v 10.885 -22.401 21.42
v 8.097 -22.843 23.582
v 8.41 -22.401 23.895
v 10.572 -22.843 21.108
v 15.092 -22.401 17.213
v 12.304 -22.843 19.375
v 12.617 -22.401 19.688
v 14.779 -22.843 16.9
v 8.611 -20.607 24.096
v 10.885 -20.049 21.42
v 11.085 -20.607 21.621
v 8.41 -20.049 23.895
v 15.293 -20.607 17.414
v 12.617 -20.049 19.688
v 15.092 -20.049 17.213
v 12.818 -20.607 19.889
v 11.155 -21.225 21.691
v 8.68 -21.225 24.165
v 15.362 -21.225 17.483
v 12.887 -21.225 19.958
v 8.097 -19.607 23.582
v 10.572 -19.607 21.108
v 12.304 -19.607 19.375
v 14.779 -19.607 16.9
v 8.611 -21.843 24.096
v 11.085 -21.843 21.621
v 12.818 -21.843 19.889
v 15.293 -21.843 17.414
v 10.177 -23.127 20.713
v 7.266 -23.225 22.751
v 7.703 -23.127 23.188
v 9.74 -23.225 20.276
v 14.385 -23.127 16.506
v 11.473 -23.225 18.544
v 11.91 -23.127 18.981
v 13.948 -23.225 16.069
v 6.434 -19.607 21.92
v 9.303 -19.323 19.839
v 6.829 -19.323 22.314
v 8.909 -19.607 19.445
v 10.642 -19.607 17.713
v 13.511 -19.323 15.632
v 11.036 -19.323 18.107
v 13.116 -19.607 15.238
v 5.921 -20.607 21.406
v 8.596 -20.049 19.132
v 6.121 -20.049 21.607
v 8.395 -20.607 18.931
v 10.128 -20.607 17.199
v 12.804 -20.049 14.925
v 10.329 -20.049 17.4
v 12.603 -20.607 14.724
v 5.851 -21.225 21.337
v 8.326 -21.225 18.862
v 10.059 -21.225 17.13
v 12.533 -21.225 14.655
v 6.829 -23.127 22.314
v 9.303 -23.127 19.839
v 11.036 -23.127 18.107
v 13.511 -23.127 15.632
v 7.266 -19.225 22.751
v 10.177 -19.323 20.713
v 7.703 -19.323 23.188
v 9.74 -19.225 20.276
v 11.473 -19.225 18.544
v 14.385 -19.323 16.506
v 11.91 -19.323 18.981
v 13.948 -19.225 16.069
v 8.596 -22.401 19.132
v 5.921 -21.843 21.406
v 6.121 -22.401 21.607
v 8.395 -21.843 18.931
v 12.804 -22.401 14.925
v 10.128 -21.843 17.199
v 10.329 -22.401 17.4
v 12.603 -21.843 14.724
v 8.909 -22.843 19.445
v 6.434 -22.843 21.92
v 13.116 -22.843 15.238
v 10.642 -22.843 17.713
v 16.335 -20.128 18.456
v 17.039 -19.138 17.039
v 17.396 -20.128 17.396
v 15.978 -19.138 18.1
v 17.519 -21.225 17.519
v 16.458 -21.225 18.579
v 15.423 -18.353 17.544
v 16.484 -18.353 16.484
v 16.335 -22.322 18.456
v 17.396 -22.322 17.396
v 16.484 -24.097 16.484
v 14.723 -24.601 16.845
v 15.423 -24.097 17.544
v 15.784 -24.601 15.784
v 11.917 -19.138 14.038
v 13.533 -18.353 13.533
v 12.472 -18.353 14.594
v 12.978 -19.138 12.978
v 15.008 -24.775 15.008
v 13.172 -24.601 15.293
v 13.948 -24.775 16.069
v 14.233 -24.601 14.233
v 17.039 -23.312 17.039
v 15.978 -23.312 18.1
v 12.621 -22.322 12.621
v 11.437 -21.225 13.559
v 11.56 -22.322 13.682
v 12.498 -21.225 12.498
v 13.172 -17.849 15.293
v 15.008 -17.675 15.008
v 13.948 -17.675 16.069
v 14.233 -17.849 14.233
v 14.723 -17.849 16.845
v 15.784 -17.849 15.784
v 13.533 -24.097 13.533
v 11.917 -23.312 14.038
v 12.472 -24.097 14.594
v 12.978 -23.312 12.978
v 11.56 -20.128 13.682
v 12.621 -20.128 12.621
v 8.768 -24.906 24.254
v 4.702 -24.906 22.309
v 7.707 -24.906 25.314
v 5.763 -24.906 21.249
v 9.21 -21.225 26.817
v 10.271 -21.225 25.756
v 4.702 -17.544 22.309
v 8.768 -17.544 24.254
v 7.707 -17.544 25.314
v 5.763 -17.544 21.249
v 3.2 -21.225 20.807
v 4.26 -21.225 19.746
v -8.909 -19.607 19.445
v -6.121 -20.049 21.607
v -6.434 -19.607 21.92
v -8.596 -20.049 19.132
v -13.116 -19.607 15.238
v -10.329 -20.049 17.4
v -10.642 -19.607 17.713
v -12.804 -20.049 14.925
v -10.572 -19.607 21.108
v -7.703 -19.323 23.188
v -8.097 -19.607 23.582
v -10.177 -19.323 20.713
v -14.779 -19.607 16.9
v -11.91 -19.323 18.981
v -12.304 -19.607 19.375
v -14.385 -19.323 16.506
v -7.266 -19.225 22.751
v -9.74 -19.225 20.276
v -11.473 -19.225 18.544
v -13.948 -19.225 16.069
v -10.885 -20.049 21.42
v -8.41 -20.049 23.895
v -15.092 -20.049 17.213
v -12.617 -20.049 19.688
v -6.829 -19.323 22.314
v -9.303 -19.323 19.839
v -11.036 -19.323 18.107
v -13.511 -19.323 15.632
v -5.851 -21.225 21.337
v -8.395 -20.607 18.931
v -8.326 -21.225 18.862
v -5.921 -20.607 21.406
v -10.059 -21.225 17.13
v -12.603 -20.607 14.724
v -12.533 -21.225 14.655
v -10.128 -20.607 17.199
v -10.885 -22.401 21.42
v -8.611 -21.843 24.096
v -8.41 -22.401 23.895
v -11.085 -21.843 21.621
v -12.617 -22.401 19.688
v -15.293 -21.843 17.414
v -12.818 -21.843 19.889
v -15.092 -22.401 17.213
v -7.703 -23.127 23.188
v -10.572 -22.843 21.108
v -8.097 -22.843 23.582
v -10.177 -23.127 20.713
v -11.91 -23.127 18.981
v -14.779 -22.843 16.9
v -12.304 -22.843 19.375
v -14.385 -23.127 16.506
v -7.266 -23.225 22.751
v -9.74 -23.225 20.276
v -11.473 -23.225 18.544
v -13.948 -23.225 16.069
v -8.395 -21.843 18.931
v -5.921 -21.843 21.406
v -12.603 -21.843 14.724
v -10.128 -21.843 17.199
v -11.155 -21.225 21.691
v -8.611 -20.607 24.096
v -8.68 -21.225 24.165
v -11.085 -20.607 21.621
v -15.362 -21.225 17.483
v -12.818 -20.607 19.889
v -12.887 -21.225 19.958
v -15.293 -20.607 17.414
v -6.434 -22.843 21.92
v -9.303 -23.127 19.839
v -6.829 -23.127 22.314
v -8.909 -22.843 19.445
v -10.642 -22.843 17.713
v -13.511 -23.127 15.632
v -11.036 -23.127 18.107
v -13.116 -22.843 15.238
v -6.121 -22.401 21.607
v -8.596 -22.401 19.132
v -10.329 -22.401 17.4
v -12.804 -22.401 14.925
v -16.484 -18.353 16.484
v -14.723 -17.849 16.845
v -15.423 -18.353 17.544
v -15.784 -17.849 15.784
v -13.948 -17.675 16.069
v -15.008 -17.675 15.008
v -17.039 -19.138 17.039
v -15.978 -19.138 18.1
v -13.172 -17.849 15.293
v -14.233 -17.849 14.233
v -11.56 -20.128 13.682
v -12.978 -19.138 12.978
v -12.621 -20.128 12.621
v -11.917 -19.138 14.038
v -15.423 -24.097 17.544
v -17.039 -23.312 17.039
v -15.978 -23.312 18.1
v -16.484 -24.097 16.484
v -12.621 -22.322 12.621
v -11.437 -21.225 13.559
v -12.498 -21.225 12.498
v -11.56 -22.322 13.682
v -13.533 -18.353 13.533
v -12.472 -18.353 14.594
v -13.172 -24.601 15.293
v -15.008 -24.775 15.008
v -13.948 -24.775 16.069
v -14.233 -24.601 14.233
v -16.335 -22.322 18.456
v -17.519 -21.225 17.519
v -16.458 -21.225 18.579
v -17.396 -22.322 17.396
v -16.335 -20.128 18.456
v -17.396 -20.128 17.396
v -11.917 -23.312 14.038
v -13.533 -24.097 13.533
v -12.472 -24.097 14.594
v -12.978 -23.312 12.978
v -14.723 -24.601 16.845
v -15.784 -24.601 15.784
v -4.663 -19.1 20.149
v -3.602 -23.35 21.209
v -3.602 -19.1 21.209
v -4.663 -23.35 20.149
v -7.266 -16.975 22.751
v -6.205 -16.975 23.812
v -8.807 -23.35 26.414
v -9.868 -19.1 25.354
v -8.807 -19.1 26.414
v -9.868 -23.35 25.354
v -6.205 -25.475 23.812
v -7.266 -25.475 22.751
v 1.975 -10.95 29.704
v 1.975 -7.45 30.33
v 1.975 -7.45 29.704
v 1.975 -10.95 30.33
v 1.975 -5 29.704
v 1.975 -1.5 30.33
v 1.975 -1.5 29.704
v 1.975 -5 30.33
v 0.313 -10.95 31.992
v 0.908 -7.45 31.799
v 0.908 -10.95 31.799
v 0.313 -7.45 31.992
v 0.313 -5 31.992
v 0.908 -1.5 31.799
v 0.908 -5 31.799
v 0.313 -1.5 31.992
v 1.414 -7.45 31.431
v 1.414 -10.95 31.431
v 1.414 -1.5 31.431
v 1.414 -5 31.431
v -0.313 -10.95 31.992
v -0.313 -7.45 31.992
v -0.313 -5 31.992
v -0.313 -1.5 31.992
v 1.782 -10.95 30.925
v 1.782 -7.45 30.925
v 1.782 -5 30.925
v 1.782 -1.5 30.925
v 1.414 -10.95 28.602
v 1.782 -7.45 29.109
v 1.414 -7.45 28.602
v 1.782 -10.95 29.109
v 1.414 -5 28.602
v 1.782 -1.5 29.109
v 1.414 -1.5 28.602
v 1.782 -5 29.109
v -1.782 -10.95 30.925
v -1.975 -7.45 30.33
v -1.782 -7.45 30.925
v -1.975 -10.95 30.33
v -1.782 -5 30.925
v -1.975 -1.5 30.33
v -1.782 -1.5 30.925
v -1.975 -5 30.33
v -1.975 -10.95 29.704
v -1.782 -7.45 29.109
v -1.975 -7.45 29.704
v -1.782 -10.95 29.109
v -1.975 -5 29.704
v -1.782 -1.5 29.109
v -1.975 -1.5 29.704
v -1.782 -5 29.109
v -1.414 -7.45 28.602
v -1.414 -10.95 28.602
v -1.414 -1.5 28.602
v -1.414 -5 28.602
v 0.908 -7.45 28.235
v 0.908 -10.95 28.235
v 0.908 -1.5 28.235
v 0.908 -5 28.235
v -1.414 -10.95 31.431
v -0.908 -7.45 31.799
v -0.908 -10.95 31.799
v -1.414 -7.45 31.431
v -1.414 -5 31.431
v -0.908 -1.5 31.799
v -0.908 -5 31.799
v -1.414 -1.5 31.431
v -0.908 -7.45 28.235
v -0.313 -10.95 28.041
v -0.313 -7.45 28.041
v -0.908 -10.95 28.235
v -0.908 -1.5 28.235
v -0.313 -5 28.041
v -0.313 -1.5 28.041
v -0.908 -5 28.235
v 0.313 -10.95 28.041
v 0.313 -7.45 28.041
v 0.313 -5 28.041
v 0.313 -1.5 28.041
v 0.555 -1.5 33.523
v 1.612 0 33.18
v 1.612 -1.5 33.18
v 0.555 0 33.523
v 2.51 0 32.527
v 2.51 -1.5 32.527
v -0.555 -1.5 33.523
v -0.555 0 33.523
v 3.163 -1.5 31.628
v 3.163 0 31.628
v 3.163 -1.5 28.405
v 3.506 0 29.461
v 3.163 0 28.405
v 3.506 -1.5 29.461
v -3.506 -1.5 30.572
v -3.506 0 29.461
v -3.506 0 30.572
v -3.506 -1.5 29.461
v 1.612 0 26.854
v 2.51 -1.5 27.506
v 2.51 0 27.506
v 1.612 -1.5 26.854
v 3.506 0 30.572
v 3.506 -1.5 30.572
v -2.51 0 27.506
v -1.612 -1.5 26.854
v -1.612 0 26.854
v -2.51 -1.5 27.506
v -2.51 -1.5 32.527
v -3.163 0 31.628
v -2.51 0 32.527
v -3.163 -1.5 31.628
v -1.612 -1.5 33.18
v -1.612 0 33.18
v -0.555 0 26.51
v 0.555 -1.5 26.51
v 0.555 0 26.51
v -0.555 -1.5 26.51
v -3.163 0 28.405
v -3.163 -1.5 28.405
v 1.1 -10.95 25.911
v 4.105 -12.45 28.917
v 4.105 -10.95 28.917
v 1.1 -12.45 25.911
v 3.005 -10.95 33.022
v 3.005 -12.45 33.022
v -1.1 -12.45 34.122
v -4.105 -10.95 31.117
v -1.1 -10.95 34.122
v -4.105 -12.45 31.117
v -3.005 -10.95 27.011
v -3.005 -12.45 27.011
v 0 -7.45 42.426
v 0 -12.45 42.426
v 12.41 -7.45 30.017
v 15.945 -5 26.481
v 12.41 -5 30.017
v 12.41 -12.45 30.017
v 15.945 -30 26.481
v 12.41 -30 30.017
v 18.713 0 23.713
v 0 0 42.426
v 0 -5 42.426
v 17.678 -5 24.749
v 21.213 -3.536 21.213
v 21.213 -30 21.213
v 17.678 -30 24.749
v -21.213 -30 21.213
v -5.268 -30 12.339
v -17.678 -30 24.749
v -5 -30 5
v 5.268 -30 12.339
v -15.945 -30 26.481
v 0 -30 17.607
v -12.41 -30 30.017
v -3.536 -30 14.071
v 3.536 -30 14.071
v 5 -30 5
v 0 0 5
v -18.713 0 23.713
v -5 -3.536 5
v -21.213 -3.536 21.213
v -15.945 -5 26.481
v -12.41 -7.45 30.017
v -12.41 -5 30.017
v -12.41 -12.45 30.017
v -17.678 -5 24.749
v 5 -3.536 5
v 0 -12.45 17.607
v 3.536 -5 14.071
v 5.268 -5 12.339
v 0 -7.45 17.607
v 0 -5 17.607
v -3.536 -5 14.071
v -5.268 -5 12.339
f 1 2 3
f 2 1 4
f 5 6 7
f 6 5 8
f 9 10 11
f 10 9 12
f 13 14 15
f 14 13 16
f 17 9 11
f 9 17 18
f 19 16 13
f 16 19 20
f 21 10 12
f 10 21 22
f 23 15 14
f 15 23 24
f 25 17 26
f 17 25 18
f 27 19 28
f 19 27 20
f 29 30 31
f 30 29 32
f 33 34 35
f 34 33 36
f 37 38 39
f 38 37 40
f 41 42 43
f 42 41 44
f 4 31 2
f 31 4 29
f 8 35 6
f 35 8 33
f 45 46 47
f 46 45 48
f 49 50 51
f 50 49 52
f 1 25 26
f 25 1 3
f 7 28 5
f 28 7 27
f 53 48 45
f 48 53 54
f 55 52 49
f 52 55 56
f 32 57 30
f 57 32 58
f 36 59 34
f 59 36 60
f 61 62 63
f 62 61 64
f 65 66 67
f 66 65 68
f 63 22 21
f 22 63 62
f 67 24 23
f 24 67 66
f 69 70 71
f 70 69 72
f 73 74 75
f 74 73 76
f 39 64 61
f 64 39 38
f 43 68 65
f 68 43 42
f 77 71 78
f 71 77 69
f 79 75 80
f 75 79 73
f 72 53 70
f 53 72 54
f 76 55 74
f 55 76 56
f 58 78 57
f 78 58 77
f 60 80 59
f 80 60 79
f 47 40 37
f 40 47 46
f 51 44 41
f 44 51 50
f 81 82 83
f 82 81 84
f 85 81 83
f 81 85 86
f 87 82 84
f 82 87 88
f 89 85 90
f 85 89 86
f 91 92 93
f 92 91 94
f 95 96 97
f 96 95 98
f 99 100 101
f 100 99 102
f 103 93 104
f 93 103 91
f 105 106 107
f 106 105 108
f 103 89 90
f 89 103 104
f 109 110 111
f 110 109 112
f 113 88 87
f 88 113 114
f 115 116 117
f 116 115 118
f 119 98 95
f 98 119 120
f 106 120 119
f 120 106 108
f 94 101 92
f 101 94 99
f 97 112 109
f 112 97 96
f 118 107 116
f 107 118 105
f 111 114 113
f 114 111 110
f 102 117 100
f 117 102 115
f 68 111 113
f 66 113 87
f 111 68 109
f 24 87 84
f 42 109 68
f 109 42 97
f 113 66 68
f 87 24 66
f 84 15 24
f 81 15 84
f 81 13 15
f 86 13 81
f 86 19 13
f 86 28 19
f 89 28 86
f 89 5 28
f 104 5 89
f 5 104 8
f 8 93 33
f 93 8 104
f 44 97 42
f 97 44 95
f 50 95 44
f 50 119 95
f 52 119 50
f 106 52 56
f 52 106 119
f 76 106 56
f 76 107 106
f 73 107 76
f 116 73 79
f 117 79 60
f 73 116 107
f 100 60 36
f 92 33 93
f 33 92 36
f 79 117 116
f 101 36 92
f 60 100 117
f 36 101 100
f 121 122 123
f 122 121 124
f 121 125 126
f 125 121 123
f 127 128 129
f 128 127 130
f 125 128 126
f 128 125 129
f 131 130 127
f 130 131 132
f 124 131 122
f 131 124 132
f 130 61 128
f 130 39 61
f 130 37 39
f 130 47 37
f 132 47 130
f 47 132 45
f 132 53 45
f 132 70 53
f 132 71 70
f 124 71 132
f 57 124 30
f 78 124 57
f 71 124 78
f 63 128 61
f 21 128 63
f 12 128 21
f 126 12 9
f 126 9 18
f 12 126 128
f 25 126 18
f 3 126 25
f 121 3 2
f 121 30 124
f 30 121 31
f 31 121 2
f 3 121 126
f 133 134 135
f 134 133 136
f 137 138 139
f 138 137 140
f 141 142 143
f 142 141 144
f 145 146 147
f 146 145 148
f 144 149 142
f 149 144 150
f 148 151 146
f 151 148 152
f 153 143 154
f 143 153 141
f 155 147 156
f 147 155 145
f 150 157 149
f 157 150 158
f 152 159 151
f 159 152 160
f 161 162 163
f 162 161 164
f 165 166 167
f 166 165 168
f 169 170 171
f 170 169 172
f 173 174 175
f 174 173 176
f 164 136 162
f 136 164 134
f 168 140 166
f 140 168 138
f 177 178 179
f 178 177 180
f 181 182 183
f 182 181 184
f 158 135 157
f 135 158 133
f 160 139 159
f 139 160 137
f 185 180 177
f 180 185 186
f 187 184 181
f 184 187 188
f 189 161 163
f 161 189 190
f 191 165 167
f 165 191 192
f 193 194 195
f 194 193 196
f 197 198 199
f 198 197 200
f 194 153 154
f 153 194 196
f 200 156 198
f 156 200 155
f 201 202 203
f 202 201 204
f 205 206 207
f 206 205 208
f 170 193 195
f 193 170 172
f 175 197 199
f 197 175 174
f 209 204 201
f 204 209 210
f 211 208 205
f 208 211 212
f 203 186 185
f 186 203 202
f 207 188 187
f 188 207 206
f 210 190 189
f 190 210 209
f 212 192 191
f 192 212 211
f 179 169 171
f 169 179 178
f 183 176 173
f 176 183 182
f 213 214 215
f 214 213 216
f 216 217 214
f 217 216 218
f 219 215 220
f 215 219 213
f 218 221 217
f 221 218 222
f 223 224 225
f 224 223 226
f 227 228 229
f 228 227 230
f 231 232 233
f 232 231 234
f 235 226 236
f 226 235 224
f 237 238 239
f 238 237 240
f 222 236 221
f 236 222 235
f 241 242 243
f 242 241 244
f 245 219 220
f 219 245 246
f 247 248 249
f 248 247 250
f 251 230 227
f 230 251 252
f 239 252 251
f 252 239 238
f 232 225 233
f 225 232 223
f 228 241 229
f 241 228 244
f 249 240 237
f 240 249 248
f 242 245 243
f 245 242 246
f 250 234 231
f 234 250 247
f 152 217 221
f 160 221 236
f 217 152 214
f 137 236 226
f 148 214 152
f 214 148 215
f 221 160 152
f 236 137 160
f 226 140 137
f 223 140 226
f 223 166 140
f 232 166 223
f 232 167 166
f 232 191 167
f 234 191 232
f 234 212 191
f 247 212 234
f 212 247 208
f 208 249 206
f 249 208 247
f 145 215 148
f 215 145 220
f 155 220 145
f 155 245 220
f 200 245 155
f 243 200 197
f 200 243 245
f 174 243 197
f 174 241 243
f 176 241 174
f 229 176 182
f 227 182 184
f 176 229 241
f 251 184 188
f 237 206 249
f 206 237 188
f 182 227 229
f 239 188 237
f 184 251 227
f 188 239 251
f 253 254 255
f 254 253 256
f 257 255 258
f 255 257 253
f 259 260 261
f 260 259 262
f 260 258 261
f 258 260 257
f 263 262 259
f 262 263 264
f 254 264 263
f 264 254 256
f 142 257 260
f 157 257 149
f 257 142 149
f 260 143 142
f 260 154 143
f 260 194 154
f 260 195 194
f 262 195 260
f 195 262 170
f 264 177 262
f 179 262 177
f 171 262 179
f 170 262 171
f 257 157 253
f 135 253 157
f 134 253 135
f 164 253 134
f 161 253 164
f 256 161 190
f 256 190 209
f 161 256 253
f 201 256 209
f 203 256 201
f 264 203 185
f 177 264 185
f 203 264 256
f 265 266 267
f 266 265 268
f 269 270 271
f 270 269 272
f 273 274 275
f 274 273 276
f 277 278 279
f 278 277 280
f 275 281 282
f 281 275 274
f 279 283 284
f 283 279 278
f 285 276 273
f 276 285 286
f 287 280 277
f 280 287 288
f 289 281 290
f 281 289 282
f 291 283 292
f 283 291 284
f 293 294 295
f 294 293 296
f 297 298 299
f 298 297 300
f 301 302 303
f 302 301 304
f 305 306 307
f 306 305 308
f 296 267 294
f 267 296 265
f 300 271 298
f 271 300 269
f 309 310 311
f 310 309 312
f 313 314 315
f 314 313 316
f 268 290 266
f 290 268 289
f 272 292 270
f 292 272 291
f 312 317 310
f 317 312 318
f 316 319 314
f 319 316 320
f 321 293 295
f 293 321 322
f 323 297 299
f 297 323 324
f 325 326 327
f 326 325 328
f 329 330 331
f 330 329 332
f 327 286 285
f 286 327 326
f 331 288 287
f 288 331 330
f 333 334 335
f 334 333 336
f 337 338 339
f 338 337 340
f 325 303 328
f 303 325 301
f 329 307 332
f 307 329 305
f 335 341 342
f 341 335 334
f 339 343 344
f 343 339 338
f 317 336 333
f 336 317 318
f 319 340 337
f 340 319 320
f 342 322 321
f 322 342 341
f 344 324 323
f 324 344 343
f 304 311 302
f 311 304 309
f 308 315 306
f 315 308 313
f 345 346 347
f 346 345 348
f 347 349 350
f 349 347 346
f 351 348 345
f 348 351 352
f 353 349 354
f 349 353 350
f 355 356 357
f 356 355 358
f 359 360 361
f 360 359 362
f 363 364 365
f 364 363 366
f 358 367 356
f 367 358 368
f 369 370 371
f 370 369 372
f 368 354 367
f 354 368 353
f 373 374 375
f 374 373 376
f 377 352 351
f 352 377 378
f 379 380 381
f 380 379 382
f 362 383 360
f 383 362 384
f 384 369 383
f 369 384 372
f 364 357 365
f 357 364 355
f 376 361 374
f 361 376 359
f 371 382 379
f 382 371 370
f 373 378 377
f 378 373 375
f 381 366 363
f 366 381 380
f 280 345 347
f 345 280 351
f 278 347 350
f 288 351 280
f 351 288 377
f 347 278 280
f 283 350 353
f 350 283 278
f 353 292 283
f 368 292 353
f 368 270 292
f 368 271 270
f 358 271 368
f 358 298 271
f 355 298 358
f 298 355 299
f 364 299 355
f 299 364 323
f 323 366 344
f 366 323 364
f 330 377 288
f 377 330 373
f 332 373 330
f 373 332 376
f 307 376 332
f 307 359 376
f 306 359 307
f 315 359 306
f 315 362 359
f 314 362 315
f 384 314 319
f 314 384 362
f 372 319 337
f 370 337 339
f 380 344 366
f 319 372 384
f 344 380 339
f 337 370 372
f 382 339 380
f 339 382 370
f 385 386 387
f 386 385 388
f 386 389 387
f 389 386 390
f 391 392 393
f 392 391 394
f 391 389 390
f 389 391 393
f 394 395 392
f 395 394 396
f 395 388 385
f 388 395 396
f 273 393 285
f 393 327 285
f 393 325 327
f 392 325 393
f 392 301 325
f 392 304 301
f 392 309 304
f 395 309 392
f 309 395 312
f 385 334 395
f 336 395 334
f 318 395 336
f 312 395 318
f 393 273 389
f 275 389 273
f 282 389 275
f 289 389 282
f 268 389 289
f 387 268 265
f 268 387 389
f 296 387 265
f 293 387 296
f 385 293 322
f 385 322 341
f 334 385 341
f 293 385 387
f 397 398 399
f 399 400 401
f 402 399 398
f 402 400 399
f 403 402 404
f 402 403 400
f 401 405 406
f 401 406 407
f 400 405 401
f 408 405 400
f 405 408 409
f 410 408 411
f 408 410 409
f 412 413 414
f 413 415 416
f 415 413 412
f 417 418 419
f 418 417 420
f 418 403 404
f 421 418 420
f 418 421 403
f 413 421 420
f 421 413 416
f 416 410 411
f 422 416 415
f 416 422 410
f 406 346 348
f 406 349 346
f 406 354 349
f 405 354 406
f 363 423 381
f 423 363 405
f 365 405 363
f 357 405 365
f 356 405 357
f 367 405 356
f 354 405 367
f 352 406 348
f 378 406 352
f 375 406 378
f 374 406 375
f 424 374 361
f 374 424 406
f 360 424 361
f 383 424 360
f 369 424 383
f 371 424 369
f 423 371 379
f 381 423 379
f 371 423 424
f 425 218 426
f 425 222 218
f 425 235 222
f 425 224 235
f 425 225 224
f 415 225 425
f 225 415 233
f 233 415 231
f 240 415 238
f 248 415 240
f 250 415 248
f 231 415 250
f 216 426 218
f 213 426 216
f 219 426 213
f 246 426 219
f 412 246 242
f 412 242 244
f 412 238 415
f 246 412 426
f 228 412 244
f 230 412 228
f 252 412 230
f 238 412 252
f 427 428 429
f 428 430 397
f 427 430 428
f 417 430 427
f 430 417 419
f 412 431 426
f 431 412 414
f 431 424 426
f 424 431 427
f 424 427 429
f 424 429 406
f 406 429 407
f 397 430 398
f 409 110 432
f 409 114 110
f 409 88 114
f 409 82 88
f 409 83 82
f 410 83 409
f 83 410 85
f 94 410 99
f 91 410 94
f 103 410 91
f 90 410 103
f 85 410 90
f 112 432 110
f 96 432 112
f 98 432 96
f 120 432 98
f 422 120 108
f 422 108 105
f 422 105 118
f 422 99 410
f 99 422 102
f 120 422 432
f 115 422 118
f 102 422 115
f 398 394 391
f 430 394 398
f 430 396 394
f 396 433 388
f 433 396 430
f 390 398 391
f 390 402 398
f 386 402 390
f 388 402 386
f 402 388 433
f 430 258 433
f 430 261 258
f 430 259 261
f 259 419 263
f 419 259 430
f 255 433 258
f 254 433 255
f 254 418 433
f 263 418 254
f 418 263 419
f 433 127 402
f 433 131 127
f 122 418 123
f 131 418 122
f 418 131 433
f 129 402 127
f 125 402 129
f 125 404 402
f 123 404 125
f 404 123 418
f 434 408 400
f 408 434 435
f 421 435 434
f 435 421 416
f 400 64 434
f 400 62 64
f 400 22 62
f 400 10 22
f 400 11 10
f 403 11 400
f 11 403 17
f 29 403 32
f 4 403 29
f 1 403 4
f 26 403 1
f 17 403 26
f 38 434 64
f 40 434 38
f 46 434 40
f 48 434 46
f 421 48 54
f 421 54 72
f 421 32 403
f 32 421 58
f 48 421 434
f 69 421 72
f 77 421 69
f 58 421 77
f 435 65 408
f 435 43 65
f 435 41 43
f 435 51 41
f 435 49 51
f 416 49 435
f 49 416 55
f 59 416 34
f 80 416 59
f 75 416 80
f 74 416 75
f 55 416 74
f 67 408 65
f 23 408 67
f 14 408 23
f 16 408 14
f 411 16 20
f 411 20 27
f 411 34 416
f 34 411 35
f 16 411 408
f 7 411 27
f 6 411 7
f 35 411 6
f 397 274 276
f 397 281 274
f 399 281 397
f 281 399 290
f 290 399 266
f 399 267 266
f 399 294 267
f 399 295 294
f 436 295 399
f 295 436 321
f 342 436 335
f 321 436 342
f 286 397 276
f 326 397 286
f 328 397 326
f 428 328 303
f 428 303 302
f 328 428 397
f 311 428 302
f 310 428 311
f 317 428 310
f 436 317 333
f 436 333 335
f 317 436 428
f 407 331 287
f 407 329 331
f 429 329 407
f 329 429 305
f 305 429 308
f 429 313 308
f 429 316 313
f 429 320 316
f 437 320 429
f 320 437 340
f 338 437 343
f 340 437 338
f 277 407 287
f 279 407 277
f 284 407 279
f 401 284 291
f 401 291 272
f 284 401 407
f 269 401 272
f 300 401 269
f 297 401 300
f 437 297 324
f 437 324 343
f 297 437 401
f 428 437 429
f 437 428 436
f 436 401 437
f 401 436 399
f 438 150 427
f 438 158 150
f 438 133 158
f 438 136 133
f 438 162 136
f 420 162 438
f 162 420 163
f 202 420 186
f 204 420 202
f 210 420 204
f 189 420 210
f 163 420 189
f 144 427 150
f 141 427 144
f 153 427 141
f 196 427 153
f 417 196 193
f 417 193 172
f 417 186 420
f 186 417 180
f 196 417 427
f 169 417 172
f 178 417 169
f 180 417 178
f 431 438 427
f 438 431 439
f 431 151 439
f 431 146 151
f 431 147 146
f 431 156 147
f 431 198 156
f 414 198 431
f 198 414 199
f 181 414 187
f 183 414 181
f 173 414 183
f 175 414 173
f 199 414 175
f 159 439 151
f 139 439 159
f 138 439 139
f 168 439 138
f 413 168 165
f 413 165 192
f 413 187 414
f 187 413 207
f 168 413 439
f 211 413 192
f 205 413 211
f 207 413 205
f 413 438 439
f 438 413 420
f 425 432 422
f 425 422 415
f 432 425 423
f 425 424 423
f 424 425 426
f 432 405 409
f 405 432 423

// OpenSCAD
GLASS_THICKNESS=2.45;
WALL_THICK=5;
WALL_LENGTH=30;

CORNER_ENTIRE_WIDTH=2*WALL_THICK + GLASS_THICKNESS;
echo("CORNER_ENTIRE_WIDTH=", CORNER_ENTIRE_WIDTH);

SCREW_OFFSET = (WALL_LENGTH-CORNER_ENTIRE_WIDTH) / 2 + CORNER_ENTIRE_WIDTH;
echo("SCREW_OFFSET=", SCREW_OFFSET);

SCREW_HEAD_DIAMETER=7.1;
SCREW_THREAD_DIAMETER=4;
SCREW_NUT_WIDTH=8.5;

module screwHole(screwLength, holeDiameter, nutWidth, headDiameter, recessDepth)
{
  // Hole
  translate([0,0,-.1])
  cylinder(screwLength+.2, holeDiameter / 2, holeDiameter/2, $fn=20);
  
  // Screw head
  translate([0,0,-.1])
  cylinder(recessDepth+.1, headDiameter / 2, headDiameter/2, $fn=20);
  
  // Nut
  translate([0,0,screwLength-recessDepth])
  cylinder(recessDepth+.1, nutWidth / 2, nutWidth/2, $fn=6);
  
  
  
}


module joint() {  
  
  difference()
  {
    cube([WALL_LENGTH, WALL_LENGTH, WALL_LENGTH]);  

    // Remove the large chunk from the middle to form the walls
    translate([CORNER_ENTIRE_WIDTH, CORNER_ENTIRE_WIDTH, CORNER_ENTIRE_WIDTH])
      cube([WALL_LENGTH, WALL_LENGTH, WALL_LENGTH]);
    
    // Remove parts for the acyrlic to slide in
    translate([CORNER_ENTIRE_WIDTH, WALL_THICK, WALL_THICK])  
      cube([WALL_LENGTH, GLASS_THICKNESS, WALL_LENGTH]);
    
    translate([CORNER_ENTIRE_WIDTH, CORNER_ENTIRE_WIDTH, WALL_THICK])
      cube([WALL_LENGTH, WALL_LENGTH, GLASS_THICKNESS]);
    
    translate([WALL_THICK, CORNER_ENTIRE_WIDTH, WALL_THICK])
      cube([GLASS_THICKNESS, WALL_LENGTH, WALL_LENGTH]);
    
    // Make a bottom for print to sit on
    rotate(-45, [0,0,1])
    translate([-WALL_THICK, -WALL_THICK, -1])
    cube([WALL_THICK*2, WALL_THICK*2, WALL_LENGTH + 2]);
    
    // Knock down sharp corders on other exposed sides
    rotate(45, [0,1,0])
      translate([-WALL_THICK/2, -1, -WALL_THICK/2])
        cube([WALL_THICK, WALL_LENGTH + 2, WALL_THICK]);
    rotate(45, [1,0,0])
      translate([-1,-WALL_THICK/2, -WALL_THICK/2])
        cube([WALL_LENGTH+2, WALL_THICK, WALL_THICK]);
        
    translate([SCREW_OFFSET, 0, SCREW_OFFSET])
    rotate(90,[-1,0,0])
    screwHole(CORNER_ENTIRE_WIDTH, SCREW_THREAD_DIAMETER, SCREW_NUT_WIDTH, SCREW_HEAD_DIAMETER, 1.5);
   
    translate([0, SCREW_OFFSET, SCREW_OFFSET])
    rotate(90,[0,1,0])
    screwHole(CORNER_ENTIRE_WIDTH, SCREW_THREAD_DIAMETER, SCREW_NUT_WIDTH, SCREW_HEAD_DIAMETER, 1.5);
    
    translate([SCREW_OFFSET, SCREW_OFFSET, 0])
    screwHole(CORNER_ENTIRE_WIDTH, SCREW_THREAD_DIAMETER, SCREW_NUT_WIDTH, SCREW_HEAD_DIAMETER, 1.5);
    
   
  }
}

//screwHole(CORNER_ENTIRE_WIDTH, SCREW_THREAD_DIAMETER, SCREW_NUT_WIDTH, SCREW_HEAD_DIAMETER, 1);


// Rotate for printing
rotate(45,[0,0,1])
rotate(-90,[-1,1,0])
joint();


    
